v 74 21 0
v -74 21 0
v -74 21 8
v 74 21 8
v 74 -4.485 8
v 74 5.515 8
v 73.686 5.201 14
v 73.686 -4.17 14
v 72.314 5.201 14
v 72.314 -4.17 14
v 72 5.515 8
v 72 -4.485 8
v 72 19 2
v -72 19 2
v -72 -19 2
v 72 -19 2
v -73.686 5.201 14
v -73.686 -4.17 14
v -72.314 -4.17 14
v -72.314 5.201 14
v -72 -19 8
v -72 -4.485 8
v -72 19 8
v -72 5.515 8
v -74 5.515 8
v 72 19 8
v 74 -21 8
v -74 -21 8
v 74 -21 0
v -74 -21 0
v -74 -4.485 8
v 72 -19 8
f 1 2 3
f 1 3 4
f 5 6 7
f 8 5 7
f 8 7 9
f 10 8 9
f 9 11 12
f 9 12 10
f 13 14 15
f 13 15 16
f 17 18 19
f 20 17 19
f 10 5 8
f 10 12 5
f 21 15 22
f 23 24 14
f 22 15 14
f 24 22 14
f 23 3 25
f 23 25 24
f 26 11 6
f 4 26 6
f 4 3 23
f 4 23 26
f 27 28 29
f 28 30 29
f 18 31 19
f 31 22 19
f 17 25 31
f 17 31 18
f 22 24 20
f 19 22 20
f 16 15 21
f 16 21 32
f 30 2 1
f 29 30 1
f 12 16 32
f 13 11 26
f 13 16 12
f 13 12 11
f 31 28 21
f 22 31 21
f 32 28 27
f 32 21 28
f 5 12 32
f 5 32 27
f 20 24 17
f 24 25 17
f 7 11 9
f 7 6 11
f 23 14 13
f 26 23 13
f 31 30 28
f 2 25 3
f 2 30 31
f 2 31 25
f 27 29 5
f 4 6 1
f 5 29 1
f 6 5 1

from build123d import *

# Parameters (mm, degrees)
SCHIZZO1_W                   = 148
SCHIZZO1_H                   = 42
ESTRUSIONE_ESTRUSIONE1_DEPTH = 2
SCHIZZO2_W                   = 148
SCHIZZO2_H                   = 42
SCHIZZO2_W_2                 = 144
SCHIZZO2_H_2                 = 38
ESTRUSIONE_ESTRUSIONE2_DEPTH = 6
SCHIZZO3_W                   = 2
SCHIZZO3_H                   = 10
ESTRUSIONE_ESTRUSIONE3_DEPTH = 6
ESTRUSIONE_ESTRUSIONE3_TAPER = 3


with BuildPart() as part:
    # Schizzo1 → Estrusione-Estrusione1 (new body)
    with BuildSketch(Plane.XY):
        Rectangle(SCHIZZO1_W, SCHIZZO1_H)
    extrude(amount=ESTRUSIONE_ESTRUSIONE1_DEPTH)

    # Schizzo2 → Estrusione-Estrusione2 (add)
    with BuildSketch(Plane.XY.offset(2)):
        Rectangle(SCHIZZO2_W, SCHIZZO2_H)
        Rectangle(SCHIZZO2_W_2, SCHIZZO2_H_2, mode=Mode.SUBTRACT)
    extrude(amount=ESTRUSIONE_ESTRUSIONE2_DEPTH)

    # Schizzo3 → Estrusione-Estrusione3 (add)
    with BuildSketch(Plane.XY.offset(8)):
        with Locations((-73, 0.515392861)):
            Rectangle(SCHIZZO3_W, SCHIZZO3_H)
    estrusione_estrusione3 = extrude(amount=ESTRUSIONE_ESTRUSIONE3_DEPTH, taper=ESTRUSIONE_ESTRUSIONE3_TAPER)

    # Specchia1: Estrusione-Estrusione3 across plane
    add(estrusione_estrusione3.mirror(Plane(origin=(0, 0, 0), x_dir=(0, 0, 1), z_dir=(1, 0, 0))))


solid = part.part
